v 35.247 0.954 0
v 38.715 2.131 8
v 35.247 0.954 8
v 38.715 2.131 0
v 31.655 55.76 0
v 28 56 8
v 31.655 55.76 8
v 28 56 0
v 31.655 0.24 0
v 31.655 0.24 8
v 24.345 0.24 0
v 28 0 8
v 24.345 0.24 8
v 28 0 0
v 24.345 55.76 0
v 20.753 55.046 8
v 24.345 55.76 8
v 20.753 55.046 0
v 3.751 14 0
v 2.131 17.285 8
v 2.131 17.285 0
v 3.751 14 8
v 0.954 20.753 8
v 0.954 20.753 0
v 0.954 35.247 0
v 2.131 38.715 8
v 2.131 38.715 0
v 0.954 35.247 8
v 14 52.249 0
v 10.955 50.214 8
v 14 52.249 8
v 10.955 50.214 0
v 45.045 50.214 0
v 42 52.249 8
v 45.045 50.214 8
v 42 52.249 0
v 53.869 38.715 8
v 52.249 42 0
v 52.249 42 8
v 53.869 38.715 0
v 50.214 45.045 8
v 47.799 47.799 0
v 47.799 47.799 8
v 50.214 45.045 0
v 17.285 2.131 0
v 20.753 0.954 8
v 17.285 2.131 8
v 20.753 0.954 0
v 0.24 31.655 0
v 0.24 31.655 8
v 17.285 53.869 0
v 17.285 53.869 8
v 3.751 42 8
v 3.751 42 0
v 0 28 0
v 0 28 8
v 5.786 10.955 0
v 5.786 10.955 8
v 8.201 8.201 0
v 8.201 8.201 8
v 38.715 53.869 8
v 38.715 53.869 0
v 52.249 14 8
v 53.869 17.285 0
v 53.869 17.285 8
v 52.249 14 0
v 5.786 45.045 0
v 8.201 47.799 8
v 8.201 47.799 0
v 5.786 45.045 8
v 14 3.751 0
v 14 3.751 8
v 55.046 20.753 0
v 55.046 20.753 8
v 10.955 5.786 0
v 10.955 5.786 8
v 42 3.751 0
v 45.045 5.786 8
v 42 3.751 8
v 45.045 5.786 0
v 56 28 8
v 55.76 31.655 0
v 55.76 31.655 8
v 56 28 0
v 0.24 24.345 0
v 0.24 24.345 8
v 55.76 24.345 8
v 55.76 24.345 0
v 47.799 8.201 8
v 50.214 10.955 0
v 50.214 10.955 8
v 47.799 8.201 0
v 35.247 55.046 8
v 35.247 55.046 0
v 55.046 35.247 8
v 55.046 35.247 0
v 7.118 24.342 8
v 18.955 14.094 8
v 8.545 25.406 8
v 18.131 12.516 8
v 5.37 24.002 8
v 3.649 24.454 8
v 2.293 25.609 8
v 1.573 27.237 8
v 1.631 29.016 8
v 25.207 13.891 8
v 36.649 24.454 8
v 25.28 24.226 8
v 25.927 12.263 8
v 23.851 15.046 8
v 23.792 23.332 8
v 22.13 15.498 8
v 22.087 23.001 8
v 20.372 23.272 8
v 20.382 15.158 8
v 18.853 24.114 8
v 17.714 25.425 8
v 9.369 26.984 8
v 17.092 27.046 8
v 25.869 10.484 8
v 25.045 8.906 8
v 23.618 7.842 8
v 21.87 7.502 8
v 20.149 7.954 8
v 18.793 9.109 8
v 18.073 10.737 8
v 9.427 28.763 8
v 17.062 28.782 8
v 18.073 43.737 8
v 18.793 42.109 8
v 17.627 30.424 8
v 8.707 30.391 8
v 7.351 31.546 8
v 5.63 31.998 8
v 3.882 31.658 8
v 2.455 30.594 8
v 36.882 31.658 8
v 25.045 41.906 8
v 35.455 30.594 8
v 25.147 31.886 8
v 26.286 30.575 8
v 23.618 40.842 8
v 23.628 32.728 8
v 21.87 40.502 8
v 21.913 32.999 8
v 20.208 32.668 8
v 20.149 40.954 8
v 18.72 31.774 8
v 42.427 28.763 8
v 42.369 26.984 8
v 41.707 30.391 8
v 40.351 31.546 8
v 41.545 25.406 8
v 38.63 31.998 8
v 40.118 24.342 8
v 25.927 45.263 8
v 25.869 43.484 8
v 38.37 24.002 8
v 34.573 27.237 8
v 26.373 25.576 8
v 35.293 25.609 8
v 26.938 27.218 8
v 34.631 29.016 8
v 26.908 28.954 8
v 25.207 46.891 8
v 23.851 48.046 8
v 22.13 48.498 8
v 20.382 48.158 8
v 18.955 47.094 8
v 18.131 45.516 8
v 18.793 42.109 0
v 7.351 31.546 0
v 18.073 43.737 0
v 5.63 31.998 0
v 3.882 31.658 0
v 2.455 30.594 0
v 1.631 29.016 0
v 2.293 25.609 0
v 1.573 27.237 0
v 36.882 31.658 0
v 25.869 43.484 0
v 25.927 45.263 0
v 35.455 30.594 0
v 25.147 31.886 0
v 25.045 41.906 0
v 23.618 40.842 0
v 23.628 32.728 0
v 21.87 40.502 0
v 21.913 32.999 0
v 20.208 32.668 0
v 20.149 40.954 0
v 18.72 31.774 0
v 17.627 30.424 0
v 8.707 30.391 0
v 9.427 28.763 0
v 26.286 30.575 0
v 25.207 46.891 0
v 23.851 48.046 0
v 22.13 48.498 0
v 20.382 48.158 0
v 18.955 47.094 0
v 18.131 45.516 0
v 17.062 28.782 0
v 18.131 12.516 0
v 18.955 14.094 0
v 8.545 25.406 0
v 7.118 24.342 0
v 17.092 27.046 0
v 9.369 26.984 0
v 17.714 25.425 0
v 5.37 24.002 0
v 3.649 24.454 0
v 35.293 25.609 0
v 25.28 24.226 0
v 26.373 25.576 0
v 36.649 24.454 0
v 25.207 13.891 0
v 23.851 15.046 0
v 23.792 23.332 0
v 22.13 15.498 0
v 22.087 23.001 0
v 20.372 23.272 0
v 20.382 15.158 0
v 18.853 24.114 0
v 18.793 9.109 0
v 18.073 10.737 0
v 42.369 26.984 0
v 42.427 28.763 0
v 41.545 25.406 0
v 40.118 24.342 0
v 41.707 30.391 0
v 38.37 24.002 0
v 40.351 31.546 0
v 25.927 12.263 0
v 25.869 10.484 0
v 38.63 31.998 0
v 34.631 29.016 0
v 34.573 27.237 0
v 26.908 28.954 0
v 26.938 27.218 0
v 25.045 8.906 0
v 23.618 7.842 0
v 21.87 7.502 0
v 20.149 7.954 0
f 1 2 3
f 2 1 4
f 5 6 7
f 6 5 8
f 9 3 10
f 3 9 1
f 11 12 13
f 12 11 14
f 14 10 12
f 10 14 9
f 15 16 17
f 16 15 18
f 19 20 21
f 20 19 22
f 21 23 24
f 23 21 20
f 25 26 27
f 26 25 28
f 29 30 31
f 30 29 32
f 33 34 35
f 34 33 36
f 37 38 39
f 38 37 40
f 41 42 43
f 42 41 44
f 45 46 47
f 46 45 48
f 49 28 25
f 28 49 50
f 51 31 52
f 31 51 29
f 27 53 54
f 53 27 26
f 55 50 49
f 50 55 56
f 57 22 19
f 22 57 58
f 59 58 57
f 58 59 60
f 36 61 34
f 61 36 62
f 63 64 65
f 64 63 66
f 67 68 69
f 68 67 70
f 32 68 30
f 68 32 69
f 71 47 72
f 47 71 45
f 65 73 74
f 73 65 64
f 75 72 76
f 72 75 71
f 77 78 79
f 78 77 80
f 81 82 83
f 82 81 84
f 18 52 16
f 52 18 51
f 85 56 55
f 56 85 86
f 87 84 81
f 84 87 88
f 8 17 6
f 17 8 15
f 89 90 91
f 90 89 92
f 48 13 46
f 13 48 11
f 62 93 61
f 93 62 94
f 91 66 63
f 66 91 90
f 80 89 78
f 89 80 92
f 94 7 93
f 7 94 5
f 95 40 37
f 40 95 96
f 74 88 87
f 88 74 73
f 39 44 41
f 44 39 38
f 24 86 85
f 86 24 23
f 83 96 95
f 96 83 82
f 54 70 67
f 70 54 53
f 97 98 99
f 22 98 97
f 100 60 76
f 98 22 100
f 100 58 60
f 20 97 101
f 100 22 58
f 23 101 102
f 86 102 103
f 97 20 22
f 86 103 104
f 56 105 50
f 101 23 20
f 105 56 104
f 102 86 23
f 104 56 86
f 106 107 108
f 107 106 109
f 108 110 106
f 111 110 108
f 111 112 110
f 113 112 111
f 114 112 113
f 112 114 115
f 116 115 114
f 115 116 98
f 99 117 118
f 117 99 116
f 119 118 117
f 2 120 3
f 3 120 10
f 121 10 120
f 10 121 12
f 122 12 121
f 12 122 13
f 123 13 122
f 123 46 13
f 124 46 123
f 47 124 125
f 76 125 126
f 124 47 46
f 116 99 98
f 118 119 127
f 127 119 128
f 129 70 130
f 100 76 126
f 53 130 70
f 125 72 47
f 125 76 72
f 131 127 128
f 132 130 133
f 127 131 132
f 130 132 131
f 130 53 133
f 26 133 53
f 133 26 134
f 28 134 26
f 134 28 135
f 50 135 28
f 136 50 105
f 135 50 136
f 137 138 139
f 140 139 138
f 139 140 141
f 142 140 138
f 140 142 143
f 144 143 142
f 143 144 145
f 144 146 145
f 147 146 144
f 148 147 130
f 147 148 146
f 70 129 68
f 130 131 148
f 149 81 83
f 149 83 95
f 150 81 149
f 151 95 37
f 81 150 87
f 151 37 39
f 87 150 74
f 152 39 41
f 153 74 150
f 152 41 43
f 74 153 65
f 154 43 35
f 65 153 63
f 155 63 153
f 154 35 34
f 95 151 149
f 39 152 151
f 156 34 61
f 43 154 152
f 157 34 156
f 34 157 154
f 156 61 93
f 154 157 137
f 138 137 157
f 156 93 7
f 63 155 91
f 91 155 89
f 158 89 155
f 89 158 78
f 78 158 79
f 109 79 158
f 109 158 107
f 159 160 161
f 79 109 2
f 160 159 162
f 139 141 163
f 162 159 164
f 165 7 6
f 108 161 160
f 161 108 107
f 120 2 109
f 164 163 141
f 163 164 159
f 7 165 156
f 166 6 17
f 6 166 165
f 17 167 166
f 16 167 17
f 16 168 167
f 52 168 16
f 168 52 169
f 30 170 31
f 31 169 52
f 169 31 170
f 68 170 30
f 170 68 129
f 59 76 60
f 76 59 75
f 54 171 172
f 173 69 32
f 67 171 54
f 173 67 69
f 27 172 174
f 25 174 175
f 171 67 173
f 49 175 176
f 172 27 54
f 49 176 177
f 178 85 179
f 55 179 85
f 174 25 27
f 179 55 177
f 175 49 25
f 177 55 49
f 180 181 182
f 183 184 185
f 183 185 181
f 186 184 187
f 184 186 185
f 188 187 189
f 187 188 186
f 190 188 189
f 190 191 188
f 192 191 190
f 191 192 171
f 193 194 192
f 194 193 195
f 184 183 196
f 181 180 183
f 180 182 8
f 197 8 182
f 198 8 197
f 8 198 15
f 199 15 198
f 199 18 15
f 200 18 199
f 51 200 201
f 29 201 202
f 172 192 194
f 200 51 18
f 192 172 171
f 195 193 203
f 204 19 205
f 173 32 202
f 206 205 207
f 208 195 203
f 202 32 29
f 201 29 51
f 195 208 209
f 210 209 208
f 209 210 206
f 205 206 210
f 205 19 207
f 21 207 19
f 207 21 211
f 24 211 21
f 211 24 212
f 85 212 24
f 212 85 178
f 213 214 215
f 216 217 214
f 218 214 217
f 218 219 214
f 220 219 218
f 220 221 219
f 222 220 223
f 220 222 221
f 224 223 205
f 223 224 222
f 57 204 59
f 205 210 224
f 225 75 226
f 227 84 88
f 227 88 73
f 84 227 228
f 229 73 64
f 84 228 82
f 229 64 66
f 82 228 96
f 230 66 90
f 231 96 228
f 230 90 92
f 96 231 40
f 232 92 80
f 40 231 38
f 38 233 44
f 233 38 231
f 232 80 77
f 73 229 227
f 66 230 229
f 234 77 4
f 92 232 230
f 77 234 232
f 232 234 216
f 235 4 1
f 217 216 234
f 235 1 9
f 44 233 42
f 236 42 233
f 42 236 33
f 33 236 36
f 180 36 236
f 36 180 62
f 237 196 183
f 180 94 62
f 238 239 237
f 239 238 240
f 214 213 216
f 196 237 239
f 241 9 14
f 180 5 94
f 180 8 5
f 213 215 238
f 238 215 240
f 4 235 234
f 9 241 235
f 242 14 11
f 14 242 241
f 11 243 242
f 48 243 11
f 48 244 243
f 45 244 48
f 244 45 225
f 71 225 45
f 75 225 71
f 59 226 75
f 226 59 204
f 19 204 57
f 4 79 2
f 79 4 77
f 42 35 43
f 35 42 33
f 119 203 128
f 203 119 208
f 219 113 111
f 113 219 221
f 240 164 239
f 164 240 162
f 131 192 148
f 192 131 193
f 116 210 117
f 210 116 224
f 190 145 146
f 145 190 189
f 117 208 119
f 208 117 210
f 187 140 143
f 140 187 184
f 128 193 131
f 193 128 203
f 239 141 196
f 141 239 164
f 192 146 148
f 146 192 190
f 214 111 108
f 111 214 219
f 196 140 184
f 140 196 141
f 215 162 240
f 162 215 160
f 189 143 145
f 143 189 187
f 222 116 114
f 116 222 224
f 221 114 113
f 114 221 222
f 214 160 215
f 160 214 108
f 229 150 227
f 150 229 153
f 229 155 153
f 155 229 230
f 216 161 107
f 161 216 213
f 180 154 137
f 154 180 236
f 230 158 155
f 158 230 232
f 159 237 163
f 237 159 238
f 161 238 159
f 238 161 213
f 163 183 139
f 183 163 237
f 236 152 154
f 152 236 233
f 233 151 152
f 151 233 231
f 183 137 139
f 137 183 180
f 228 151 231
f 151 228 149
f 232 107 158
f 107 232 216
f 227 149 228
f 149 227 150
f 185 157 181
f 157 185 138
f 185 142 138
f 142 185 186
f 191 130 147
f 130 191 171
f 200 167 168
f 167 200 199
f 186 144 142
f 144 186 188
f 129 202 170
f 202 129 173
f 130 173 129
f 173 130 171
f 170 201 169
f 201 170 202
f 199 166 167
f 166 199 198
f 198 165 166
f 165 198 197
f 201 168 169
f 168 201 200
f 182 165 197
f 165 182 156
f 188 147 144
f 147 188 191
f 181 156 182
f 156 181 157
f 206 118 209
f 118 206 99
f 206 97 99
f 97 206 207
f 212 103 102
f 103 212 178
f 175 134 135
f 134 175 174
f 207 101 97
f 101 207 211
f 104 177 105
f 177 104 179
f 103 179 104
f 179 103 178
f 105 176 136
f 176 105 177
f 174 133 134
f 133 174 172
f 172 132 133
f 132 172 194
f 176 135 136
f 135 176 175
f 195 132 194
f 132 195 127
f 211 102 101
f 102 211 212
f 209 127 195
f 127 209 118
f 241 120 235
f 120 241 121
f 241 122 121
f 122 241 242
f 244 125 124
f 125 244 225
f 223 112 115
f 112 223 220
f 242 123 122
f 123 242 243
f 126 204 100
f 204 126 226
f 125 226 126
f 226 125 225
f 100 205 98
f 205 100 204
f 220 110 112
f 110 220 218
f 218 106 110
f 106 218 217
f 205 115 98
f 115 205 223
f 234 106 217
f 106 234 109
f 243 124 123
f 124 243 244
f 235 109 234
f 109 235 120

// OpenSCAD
$fn = 32;

// ----------------------------------------------------------------------
// Cam plate: eccentric cam, base R28
// ----------------------------------------------------------------------

// --- parameters (mm) ---
base_r = 28;              // base circle radius
lobe_h = 12;              // cam lobe rise
bore_r = 5;               // shaft bore radius
plate_t = 8;              // plate thickness, Z (extrusion height)
ecc = 6;                  // disc eccentricity
ring_r = 16.5;            // lightening ring radius
bolt_r = 4;               // lightening hole radius

profile = [[56, 28], [55.76, 31.655], [55.046, 35.247], [53.869, 38.715], [52.249, 42], [50.214, 45.045], [47.799, 47.799], [45.045, 50.214], [42, 52.249], [38.715, 53.869], [35.247, 55.046], [31.655, 55.76], [28, 56], [24.345, 55.76], [20.753, 55.046], [17.285, 53.869], [14, 52.249], [10.955, 50.214], [8.201, 47.799], [5.786, 45.045], [3.751, 42], [2.131, 38.715], [0.954, 35.247], [0.24, 31.655], [0, 28], [0.24, 24.345], [0.954, 20.753], [2.131, 17.285], [3.751, 14], [5.786, 10.955], [8.201, 8.201], [10.955, 5.786], [14, 3.751], [17.285, 2.131], [20.753, 0.954], [24.345, 0.24], [28, 0], [31.655, 0.24], [35.247, 0.954], [38.715, 2.131], [42, 3.751], [45.045, 5.786], [47.799, 8.201], [50.214, 10.955], [52.249, 14], [53.869, 17.285], [55.046, 20.753], [55.76, 24.345]];  // primary outline, 48 points, counter clockwise
void_1 = [[26.908, 28.954], [26.286, 30.575], [25.147, 31.886], [23.628, 32.728], [21.913, 32.999], [20.208, 32.668], [18.72, 31.774], [17.627, 30.424], [17.062, 28.782], [17.092, 27.046], [17.714, 25.425], [18.853, 24.114], [20.372, 23.272], [22.087, 23.001], [23.792, 23.332], [25.28, 24.226], [26.373, 25.576], [26.938, 27.218]];  // shaft bore, 18 points
void_2 = [[42.427, 28.763], [41.707, 30.391], [40.351, 31.546], [38.63, 31.998], [36.882, 31.658], [35.455, 30.594], [34.631, 29.016], [34.573, 27.237], [35.293, 25.609], [36.649, 24.454], [38.37, 24.002], [40.118, 24.342], [41.545, 25.406], [42.369, 26.984]];  // lightening hole 1, 14 points
void_3 = [[25.927, 45.263], [25.207, 46.891], [23.851, 48.046], [22.13, 48.498], [20.382, 48.158], [18.955, 47.094], [18.131, 45.516], [18.073, 43.737], [18.793, 42.109], [20.149, 40.954], [21.87, 40.502], [23.618, 40.842], [25.045, 41.906], [25.869, 43.484]];  // lightening hole 2, 14 points
void_4 = [[9.427, 28.763], [8.707, 30.391], [7.351, 31.546], [5.63, 31.998], [3.882, 31.658], [2.455, 30.594], [1.631, 29.016], [1.573, 27.237], [2.293, 25.609], [3.649, 24.454], [5.37, 24.002], [7.118, 24.342], [8.545, 25.406], [9.369, 26.984]];  // lightening hole 3, 14 points
void_5 = [[25.927, 12.263], [25.207, 13.891], [23.851, 15.046], [22.13, 15.498], [20.382, 15.158], [18.955, 14.094], [18.131, 12.516], [18.073, 10.737], [18.793, 9.109], [20.149, 7.954], [21.87, 7.502], [23.618, 7.842], [25.045, 8.906], [25.869, 10.484]];  // lightening hole 4, 14 points

// --- the one profile operation ---
difference() {
  linear_extrude(height = plate_t) polygon(points = profile);
  translate([0, 0, -1])
    linear_extrude(height = plate_t + 2) polygon(points = void_1);
  translate([0, 0, -1])
    linear_extrude(height = plate_t + 2) polygon(points = void_2);
  translate([0, 0, -1])
    linear_extrude(height = plate_t + 2) polygon(points = void_3);
  translate([0, 0, -1])
    linear_extrude(height = plate_t + 2) polygon(points = void_4);
  translate([0, 0, -1])
    linear_extrude(height = plate_t + 2) polygon(points = void_5);
}
